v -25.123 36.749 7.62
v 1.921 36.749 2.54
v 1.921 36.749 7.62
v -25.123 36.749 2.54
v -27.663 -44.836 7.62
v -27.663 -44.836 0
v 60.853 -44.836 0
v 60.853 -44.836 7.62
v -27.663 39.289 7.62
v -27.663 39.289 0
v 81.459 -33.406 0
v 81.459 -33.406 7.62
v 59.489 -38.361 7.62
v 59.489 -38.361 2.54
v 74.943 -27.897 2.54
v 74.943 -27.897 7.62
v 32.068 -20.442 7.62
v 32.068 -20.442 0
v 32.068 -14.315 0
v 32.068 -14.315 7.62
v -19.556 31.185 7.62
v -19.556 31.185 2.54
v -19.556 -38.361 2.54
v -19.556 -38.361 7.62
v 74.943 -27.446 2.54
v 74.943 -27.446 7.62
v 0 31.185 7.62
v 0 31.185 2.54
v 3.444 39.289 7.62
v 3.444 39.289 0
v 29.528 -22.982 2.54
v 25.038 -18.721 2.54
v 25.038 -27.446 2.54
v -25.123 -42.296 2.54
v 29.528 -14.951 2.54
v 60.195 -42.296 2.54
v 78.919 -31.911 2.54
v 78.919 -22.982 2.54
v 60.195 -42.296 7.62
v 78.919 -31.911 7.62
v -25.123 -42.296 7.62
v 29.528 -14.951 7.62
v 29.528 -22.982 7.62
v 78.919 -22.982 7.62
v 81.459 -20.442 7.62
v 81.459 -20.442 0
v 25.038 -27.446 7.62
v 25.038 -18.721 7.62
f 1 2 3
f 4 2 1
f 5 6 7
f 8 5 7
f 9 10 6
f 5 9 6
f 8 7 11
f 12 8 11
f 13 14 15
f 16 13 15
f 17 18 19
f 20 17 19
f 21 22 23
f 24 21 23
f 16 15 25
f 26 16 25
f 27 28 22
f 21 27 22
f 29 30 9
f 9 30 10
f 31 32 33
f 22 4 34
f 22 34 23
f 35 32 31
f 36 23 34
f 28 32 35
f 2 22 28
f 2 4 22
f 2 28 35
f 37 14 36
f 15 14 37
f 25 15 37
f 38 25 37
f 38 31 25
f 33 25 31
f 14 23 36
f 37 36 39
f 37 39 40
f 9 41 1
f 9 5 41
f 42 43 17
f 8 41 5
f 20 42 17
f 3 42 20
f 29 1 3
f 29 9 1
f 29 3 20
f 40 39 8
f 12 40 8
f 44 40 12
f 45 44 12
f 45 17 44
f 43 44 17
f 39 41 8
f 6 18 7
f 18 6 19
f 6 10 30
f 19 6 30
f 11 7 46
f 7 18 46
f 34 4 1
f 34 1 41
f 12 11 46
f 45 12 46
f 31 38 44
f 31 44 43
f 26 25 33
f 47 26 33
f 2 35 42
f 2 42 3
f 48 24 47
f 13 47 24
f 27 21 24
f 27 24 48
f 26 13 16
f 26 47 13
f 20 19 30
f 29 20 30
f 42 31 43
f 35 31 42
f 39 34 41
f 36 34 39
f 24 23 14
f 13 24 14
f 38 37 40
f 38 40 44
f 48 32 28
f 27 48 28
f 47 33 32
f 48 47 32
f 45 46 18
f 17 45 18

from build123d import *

# Parameters (mm, degrees)
F1_DEPTH = 7.62
F2_T     = -2.54
F4_DEPTH = 5.08


with BuildPart() as f1:
    # F0 (on Top) → F1 (new body)
    with BuildSketch(Plane.XY):
        Polygon((32.0682525635, -14.3153322861), (3.4442073984, 39.2894335091), (-27.6627708226, 39.2894335091), (-27.6627708226, -44.8362566531), (60.85267663, -44.8362566531), (81.4588740468, -33.4062539041), (81.4588740468, -20.4415936023), (32.0682525635, -20.4415936023), align=None)
    extrude(amount=F1_DEPTH)

    # F2
    f2_openings = [f1.faces().sort_by_distance(p)[0] for p in [
        (9.989967, -12.135941, 7.62),
    ]]
    offset(amount=F2_T, openings=f2_openings, kind=Kind.INTERSECTION)

    # F3 (on face) → F4 (join)
    with BuildSketch(Plane.XY.offset(2.54)):
        Polygon((25.0375904143, -18.7208298594), (0, 31.1848036945), (-19.5555072278, 31.1848036945), (-19.5555072278, -38.3611097932), (59.4885759056, -38.3611097932), (74.9432295561, -27.8970263898), (74.9432295561, -27.4460842204), (25.0375904143, -27.4460842204), align=None)
    extrude(amount=F4_DEPTH)


solid = f1.part
